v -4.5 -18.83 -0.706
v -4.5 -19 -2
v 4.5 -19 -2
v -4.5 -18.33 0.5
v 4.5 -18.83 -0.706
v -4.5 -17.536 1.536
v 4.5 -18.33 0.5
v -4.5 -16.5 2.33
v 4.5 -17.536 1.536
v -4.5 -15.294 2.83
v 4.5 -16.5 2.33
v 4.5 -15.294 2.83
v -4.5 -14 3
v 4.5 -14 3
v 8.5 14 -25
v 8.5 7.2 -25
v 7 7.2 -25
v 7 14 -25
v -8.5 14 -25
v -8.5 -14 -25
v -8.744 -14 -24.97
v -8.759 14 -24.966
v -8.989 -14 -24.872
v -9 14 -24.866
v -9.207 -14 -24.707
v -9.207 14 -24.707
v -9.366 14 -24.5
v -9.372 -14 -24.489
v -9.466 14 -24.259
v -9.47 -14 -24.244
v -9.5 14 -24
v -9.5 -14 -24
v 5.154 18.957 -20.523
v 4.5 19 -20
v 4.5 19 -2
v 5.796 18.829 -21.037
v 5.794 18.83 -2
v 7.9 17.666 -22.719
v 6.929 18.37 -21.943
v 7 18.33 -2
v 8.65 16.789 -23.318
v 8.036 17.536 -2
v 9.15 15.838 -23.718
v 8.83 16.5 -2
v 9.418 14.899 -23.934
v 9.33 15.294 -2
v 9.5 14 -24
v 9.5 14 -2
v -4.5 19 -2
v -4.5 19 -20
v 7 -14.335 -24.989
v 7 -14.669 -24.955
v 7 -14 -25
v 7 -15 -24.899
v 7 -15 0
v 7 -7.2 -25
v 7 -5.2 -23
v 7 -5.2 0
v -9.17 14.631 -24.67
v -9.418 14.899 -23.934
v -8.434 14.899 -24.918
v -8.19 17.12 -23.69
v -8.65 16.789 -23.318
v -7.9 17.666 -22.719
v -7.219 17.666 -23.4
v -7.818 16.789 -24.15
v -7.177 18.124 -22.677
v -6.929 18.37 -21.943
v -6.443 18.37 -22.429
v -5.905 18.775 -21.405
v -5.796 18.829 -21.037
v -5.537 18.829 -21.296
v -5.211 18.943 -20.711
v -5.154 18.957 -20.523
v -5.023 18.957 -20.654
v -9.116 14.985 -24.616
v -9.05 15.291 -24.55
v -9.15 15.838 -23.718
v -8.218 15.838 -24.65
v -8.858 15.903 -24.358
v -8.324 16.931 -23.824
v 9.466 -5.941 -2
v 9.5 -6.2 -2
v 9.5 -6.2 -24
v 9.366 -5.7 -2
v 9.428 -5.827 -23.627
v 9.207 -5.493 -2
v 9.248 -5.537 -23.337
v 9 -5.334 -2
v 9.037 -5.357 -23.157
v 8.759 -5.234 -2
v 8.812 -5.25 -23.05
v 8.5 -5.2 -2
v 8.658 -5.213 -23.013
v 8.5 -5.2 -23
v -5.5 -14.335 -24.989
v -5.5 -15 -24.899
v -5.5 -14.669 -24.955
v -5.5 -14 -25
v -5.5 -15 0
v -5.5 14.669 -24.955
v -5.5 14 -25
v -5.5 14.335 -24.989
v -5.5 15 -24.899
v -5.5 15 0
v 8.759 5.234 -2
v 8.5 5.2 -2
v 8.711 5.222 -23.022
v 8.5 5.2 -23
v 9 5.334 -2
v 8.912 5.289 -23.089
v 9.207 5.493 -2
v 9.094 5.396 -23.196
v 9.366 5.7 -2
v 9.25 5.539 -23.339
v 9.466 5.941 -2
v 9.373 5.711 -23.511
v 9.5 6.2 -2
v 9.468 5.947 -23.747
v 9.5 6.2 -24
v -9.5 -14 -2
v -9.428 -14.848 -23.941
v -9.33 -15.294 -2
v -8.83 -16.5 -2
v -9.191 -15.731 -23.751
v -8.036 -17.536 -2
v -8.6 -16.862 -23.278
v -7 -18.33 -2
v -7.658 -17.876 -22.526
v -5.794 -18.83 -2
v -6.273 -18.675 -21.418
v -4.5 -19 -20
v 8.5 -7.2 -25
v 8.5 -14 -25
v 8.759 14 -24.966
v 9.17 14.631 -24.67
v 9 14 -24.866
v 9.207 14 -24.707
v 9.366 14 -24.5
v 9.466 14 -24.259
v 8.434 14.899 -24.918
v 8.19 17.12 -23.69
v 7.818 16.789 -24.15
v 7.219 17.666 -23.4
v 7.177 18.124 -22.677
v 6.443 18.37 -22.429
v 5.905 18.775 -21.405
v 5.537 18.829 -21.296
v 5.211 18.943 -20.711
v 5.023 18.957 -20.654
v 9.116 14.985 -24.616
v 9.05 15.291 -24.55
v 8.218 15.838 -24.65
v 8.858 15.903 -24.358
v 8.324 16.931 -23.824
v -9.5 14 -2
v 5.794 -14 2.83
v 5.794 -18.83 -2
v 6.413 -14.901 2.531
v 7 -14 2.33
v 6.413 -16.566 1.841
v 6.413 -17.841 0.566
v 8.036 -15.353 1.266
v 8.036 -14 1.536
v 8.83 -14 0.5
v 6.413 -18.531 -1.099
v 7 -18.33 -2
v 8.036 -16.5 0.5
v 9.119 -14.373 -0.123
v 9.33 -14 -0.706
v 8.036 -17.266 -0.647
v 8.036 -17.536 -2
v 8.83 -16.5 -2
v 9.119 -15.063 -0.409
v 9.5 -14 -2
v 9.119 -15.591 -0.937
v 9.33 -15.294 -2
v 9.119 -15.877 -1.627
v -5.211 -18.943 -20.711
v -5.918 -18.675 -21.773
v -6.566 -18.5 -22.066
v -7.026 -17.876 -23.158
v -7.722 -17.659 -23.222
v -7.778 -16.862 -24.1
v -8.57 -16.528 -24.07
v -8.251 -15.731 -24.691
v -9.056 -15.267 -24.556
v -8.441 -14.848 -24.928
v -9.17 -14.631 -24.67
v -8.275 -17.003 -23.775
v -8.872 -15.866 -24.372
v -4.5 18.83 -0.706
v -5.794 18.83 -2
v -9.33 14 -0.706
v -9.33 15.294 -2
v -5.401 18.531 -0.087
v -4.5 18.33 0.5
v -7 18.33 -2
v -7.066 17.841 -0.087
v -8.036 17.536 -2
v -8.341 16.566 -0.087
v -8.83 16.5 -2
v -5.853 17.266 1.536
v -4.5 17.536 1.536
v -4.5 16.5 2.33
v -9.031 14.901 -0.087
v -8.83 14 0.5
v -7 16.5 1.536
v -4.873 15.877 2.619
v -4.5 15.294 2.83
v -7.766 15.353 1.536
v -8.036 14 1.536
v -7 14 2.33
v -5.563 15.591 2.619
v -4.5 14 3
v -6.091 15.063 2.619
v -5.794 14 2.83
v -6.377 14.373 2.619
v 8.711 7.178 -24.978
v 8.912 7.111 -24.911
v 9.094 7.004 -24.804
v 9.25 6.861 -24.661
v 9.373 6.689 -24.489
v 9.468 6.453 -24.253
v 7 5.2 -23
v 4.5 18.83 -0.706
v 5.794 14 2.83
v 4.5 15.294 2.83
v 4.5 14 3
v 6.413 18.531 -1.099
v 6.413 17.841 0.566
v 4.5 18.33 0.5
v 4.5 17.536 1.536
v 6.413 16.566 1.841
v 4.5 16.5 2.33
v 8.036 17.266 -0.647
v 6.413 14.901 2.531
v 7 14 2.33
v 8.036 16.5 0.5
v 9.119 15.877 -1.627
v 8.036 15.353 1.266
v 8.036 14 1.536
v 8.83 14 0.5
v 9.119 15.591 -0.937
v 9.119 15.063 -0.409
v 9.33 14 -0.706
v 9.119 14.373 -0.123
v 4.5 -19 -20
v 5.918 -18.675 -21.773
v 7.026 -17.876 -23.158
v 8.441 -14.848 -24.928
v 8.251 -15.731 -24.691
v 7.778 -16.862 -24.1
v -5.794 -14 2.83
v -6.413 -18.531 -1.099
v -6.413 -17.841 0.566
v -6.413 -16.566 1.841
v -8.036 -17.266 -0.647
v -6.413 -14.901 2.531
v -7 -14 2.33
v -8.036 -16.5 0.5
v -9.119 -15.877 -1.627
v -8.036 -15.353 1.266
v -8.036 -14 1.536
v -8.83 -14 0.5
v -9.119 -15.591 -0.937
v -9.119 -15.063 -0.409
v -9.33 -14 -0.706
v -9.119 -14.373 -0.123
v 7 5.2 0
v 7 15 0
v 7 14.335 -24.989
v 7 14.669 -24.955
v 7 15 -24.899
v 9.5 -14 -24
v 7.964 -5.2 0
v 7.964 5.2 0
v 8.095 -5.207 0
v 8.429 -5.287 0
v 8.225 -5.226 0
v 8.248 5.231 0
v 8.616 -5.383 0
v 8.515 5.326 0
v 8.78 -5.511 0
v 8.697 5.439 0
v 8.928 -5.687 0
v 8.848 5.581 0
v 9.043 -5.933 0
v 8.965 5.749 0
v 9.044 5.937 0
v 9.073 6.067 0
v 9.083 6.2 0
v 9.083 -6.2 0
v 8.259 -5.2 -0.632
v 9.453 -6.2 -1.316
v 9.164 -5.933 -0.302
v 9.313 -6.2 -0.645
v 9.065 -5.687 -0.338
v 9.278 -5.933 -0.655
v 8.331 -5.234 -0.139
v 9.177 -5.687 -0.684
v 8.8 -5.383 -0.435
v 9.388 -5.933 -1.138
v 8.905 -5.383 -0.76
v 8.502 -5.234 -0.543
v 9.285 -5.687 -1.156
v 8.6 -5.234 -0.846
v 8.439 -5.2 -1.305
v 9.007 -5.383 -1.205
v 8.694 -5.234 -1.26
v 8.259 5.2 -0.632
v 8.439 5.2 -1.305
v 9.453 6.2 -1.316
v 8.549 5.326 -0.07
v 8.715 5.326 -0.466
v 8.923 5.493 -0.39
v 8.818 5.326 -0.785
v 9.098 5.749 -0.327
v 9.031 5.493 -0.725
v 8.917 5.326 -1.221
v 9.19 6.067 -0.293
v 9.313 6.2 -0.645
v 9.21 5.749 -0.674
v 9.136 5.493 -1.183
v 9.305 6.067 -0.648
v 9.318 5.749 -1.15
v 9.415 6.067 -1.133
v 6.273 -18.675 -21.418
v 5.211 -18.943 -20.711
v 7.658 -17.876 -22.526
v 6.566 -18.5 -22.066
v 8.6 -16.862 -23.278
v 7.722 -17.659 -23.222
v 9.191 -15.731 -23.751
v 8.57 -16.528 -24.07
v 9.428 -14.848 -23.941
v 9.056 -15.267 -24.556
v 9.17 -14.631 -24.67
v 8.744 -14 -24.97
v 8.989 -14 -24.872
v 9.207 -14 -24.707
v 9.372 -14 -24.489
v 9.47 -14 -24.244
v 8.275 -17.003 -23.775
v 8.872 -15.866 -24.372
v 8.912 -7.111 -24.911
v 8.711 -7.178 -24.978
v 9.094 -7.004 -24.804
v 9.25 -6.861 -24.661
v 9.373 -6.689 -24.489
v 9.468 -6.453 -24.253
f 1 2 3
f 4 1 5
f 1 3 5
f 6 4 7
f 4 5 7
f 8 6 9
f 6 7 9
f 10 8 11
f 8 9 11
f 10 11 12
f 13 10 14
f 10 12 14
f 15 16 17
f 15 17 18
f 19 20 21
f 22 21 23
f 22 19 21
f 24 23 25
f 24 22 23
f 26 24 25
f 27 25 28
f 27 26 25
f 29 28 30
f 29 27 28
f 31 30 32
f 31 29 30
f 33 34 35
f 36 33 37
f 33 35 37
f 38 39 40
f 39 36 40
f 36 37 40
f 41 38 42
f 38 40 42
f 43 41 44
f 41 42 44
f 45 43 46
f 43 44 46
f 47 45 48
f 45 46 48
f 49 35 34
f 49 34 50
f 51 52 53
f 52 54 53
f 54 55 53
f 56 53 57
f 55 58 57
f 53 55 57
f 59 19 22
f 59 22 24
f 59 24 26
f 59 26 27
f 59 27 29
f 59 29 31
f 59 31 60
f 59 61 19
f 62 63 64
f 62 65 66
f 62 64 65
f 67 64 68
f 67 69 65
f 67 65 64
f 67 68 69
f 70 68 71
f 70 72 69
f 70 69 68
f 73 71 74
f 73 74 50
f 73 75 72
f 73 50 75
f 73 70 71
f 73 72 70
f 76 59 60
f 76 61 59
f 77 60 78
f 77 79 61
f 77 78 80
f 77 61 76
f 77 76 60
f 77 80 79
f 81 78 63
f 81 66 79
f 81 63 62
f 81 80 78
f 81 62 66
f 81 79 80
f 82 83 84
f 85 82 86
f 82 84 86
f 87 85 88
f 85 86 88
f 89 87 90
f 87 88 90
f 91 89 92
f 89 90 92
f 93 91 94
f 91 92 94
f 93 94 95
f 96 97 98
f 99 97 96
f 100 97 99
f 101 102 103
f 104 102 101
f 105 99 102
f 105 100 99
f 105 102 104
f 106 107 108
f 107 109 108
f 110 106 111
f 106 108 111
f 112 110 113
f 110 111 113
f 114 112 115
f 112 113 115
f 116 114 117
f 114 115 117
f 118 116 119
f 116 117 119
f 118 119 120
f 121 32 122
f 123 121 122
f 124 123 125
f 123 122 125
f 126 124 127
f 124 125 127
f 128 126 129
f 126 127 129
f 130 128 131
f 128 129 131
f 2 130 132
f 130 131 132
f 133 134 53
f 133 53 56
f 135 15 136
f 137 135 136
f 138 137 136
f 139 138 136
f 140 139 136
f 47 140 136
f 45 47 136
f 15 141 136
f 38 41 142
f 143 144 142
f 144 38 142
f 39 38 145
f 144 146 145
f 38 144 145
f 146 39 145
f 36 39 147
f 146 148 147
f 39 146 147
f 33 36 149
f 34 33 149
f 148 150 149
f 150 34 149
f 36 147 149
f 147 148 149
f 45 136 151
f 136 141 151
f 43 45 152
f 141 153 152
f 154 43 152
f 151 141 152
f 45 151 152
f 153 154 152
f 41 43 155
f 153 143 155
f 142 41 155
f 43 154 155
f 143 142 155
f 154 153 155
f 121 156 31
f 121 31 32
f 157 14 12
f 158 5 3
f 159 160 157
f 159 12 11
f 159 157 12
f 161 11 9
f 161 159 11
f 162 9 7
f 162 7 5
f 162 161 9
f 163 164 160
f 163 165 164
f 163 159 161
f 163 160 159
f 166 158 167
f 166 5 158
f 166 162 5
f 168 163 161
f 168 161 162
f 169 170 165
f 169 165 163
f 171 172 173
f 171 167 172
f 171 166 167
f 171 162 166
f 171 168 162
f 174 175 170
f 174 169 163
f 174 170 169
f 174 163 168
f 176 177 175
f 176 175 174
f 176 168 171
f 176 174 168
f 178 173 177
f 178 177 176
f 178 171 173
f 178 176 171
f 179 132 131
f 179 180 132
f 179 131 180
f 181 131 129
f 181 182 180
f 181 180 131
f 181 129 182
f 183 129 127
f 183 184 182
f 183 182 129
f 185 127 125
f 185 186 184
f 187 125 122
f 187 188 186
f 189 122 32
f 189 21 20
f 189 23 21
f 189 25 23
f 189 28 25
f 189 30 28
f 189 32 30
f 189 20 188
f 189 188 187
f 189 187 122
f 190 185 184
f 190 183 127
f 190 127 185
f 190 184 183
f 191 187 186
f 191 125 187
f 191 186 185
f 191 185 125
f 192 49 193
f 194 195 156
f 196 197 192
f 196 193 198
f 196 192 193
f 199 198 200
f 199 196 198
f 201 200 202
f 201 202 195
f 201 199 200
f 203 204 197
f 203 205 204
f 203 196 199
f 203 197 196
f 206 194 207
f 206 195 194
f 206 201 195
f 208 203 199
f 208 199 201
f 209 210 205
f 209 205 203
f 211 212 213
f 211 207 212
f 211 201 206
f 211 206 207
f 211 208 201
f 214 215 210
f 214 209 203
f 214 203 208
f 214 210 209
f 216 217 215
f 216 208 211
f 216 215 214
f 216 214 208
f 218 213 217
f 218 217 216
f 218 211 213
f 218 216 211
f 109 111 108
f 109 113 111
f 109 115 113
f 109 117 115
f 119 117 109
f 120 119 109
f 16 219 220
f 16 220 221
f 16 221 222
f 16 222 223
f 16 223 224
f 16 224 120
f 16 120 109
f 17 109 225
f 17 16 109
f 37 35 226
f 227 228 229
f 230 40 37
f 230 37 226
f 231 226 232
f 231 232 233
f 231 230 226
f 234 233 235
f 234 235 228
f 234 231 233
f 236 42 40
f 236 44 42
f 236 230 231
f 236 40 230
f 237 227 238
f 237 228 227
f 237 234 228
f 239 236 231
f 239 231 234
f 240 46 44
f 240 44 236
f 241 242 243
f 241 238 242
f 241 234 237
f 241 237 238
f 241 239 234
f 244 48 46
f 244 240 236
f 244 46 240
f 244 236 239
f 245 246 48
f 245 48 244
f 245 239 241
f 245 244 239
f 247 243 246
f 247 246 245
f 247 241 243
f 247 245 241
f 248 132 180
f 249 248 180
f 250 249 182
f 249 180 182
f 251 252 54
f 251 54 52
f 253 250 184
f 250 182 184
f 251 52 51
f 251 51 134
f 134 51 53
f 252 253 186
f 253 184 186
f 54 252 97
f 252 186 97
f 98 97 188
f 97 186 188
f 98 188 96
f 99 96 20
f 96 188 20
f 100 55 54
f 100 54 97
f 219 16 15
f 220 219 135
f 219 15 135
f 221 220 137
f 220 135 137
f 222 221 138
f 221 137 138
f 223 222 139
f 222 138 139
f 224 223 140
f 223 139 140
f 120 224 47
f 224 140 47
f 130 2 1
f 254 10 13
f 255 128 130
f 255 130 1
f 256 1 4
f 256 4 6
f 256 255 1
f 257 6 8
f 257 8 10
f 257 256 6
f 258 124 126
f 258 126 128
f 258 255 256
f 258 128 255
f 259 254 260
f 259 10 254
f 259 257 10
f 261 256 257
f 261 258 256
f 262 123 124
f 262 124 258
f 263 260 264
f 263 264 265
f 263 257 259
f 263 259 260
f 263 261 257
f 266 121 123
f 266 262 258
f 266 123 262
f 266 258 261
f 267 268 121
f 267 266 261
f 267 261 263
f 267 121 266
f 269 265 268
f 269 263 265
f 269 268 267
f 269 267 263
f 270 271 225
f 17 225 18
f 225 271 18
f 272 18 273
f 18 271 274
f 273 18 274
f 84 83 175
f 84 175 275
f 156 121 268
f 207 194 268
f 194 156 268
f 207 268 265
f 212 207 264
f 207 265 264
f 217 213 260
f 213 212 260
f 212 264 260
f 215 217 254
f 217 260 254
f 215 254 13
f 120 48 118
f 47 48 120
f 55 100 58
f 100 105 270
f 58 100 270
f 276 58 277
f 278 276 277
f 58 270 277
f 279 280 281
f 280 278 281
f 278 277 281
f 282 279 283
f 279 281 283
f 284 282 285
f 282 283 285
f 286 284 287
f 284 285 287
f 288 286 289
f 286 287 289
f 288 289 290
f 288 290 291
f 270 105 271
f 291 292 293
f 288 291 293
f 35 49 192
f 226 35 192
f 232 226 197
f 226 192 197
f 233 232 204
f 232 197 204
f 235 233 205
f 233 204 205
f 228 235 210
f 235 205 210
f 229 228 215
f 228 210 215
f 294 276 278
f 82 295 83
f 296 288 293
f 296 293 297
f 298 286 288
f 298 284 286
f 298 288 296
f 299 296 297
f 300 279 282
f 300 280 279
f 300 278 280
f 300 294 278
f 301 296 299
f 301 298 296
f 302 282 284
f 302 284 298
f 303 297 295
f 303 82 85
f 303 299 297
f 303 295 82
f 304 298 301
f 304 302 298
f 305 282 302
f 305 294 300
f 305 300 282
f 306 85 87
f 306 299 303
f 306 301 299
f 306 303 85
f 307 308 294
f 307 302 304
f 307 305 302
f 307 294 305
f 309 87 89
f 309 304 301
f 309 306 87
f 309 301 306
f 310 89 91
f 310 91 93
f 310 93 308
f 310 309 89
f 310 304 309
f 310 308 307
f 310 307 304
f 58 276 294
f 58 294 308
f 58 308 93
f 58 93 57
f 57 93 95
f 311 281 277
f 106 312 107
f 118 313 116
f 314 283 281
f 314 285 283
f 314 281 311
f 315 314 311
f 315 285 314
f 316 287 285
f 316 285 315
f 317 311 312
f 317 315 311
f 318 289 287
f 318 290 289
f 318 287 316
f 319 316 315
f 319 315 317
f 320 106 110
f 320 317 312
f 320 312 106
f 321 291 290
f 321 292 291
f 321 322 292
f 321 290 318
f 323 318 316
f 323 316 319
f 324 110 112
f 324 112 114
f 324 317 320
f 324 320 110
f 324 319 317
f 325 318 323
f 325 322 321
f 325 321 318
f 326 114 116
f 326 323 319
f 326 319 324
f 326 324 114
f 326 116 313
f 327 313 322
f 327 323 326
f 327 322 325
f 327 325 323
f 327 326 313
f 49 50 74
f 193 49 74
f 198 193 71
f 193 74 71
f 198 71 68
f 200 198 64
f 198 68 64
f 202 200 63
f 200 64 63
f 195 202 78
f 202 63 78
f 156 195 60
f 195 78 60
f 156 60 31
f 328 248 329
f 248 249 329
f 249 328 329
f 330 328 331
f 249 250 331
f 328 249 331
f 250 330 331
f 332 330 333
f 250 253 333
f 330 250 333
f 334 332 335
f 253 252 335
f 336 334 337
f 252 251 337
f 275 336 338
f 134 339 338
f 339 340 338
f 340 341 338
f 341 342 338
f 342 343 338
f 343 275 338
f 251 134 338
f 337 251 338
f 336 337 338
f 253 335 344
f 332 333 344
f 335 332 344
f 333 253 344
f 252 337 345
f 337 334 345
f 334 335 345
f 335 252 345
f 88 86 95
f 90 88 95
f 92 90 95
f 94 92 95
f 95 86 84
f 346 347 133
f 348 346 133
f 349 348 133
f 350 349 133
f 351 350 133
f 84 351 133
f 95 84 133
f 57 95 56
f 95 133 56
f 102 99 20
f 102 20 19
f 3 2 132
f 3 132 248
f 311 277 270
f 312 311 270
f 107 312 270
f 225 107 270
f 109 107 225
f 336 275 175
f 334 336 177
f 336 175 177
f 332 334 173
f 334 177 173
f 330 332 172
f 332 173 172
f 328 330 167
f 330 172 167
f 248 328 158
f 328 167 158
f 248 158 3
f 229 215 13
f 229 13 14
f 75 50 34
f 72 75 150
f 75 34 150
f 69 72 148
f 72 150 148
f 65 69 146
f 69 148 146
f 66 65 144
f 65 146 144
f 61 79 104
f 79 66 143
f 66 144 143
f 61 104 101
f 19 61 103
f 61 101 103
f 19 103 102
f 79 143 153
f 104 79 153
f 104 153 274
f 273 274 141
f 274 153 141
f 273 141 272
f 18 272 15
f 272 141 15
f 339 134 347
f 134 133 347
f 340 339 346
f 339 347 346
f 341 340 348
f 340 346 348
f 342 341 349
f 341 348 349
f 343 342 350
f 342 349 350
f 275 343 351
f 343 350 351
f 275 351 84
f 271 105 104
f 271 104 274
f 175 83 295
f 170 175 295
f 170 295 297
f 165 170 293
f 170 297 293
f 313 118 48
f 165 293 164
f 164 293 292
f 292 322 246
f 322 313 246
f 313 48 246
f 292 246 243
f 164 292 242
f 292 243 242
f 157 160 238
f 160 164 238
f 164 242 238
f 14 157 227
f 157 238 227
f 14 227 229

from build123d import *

# Parameters (mm, degrees)
SKETCH_1_W      = 19
SKETCH_1_H      = 38
EXTRUDE_1_DEPTH = 3
EXTRUDE_2_DEPTH = 25
SKETCH_5_W      = 25
SKETCH_5_H      = 9.8
EXTRUDE_3_DEPTH = 2.5
CHAMFER_1_SIZE  = 2
FILLET_2_R      = 5
FILLET_3_R      = 1
FILLET_4_R      = 1


# Some blends are built 0.0001 mm under size
with BuildPart() as part:
    # 草图1 → 凸台-拉伸1 (new body)
    with BuildSketch(Plane.XY):
        Rectangle(SKETCH_1_W, SKETCH_1_H)
    extrude(amount=EXTRUDE_1_DEPTH)

    # 草图2 → 凸台-拉伸2 (add)
    with BuildSketch(Plane(origin=(0, 0, 0), x_dir=(-1, 0, 0), z_dir=(0, 0, -1))):
        Polygon((-9.5, 19), (9.5, 19), (9.5, -19), (-9.5, -19), (-9.5, -15), (5.5, -15), (5.5, 15), (-9.5, 15), align=None)
    extrude(amount=EXTRUDE_2_DEPTH)

    # 草图5 → 凸台-拉伸3 (add)
    with BuildSketch(Plane(origin=(9.5, 0, 0), x_dir=(0, 0, -1), z_dir=(1, 0, 0))):
        with Locations((12.5, 10.1)):
            Rectangle(SKETCH_5_W, SKETCH_5_H)
        with Locations((12.5, -10.1)):
            Rectangle(SKETCH_5_W, SKETCH_5_H)
    extrude(amount=-EXTRUDE_3_DEPTH)

    # 倒角1
    chamfer_1_edges = [part.edges().sort_by_distance(p)[0] for p in [
        (8.25, 5.2, -25),
        (8.25, -5.2, -25),
    ]]
    chamfer(chamfer_1_edges, length=CHAMFER_1_SIZE)

    # 圆角2
    # the kernel refuses this fillet: 5 mm, written as the material it takes off along each edge
    with BuildSketch(Plane(origin=(4.5, -14, -2), x_dir=(0, -1, 0), z_dir=(1, 0, 0))) as fillet_2_piece_1_section:
        Polygon((0, 0), (FILLET_2_R, 0), (FILLET_2_R, -FILLET_2_R), (0, -FILLET_2_R), align=None)
    fillet_2_piece_1 = extrude(amount=FILLET_2_R, mode=Mode.PRIVATE)
    fillet_2_piece_1 = fillet_2_piece_1 - Plane(origin=(4.5, -14, -2), x_dir=(0, 0.7071067811865475, -0.7071067811865475), z_dir=(1, 0, 0)) * Sphere(FILLET_2_R, mode=Mode.PRIVATE)
    add(fillet_2_piece_1, mode=Mode.SUBTRACT)
    with BuildSketch(Plane(origin=(-4.5, -14, -2), x_dir=(0, -1, 0), z_dir=(-1, 0, 0))) as fillet_2_piece_2_section:
        Polygon((0, 0), (FILLET_2_R, 0), (FILLET_2_R, FILLET_2_R), (0, FILLET_2_R), align=None)
    fillet_2_piece_2 = extrude(amount=FILLET_2_R, mode=Mode.PRIVATE)
    fillet_2_piece_2 = fillet_2_piece_2 - Plane(origin=(-4.5, -14, -2), x_dir=(0, 0.7071067811865475, -0.7071067811865475), z_dir=(-1, 0, 0)) * Sphere(FILLET_2_R, mode=Mode.PRIVATE)
    add(fillet_2_piece_2, mode=Mode.SUBTRACT)
    with BuildSketch(Plane(origin=(-4.5, 14, -2), x_dir=(-1, 0, 0), z_dir=(0, 0, 1))) as fillet_2_piece_3_section:
        Polygon((0, 0), (FILLET_2_R, 0), (FILLET_2_R, -FILLET_2_R), (0, -FILLET_2_R), align=None)
    fillet_2_piece_3 = extrude(amount=FILLET_2_R, mode=Mode.PRIVATE)
    fillet_2_piece_3 = fillet_2_piece_3 - Plane(origin=(-4.5, 14, -2), x_dir=(0.7071067811865476, -0.7071067811865475, 0), z_dir=(0, 0, 1)) * Sphere(FILLET_2_R, mode=Mode.PRIVATE)
    add(fillet_2_piece_3, mode=Mode.SUBTRACT)
    with BuildSketch(Plane(origin=(4.5, 14, -2), x_dir=(0, 0, 1), z_dir=(1, 0, 0))) as fillet_2_piece_4_section:
        Polygon((0, 0), (FILLET_2_R, 0), (FILLET_2_R, -FILLET_2_R), (0, -FILLET_2_R), align=None)
    fillet_2_piece_4 = extrude(amount=FILLET_2_R, mode=Mode.PRIVATE)
    fillet_2_piece_4 = fillet_2_piece_4 - Plane(origin=(4.5, 14, -2), x_dir=(0, -0.7071067811865475, -0.7071067811865475), z_dir=(1, 0, 0)) * Sphere(FILLET_2_R, mode=Mode.PRIVATE)
    add(fillet_2_piece_4, mode=Mode.SUBTRACT)
    with BuildSketch(Plane(origin=(9.5, -19, -2), x_dir=(0, 1, 0), z_dir=(0, 0, -1))) as fillet_2_piece_5:
        with BuildLine():
            CenterArc((FILLET_2_R, -FILLET_2_R), FILLET_2_R, 90, 90)
            Line((0, -FILLET_2_R), (0, 0))
            Line((0, 0), (FILLET_2_R, 0))
        make_face()
    extrude(amount=35.5, mode=Mode.SUBTRACT)
    with BuildSketch(Plane(origin=(-22, -19, -25), x_dir=(0, 1, 0), z_dir=(1, 0, 0)), Plane(origin=(22, 19, -25), x_dir=(0, -1, 0), z_dir=(-1, 0, 0))) as fillet_2_piece_6:
        with BuildLine():
            CenterArc((FILLET_2_R, FILLET_2_R), FILLET_2_R, 180, 90)
            Line((0, FILLET_2_R), (0, 0))
            Line((0, 0), (FILLET_2_R, 0))
        make_face()
    extrude(amount=44, mode=Mode.SUBTRACT)
    with BuildSketch(Plane(origin=(4.5, -19, 3), x_dir=(0, 0, -1), z_dir=(-1, 0, 0)), Plane(origin=(-4.5, 19, 3), x_dir=(0, 0, -1), z_dir=(1, 0, 0))) as fillet_2_piece_7:
        with BuildLine():
            CenterArc((FILLET_2_R, -FILLET_2_R), FILLET_2_R, 90, 90)
            Line((0, -FILLET_2_R), (0, 0))
            Line((0, 0), (FILLET_2_R, 0))
        make_face()
    extrude(amount=9, mode=Mode.SUBTRACT)
    with BuildSketch(Plane(origin=(-9.5, -19, -37.5), x_dir=(1, 0, 0), z_dir=(0, 0, 1)), Plane(origin=(-9.5, 19, -37.5), x_dir=(0, -1, 0), z_dir=(0, 0, 1)), Plane(origin=(9.5, 19, -2), x_dir=(0, -1, 0), z_dir=(0, 0, -1))) as fillet_2_piece_8:
        with BuildLine():
            CenterArc((FILLET_2_R, FILLET_2_R), FILLET_2_R, 180, 90)
            Line((0, FILLET_2_R), (0, 0))
            Line((0, 0), (FILLET_2_R, 0))
        make_face()
    extrude(amount=35.5, mode=Mode.SUBTRACT)
    with BuildSketch(Plane(origin=(-9.5, -14, 3), x_dir=(0, 0, -1), z_dir=(0, 1, 0)), Plane(origin=(9.5, 14, 3), x_dir=(0, 0, -1), z_dir=(0, -1, 0))) as fillet_2_piece_9:
        with BuildLine():
            CenterArc((FILLET_2_R, -FILLET_2_R), FILLET_2_R, 90, 90)
            Line((0, -FILLET_2_R), (0, 0))
            Line((0, 0), (FILLET_2_R, 0))
        make_face()
    extrude(amount=28, mode=Mode.SUBTRACT)

    # 圆角3
    fillet_3_edges = [part.edges().sort_by_distance(p)[0] for p in [
        (-7.730244537, 17.816480084, -23.230244537),
        (-7.730244537, -17.816480084, -23.230244537),
        (-9.5, 0, -25),
    ]]
    fillet(fillet_3_edges, radius=FILLET_3_R)

    # 圆角4
    fillet_4_edges = [part.edges().sort_by_distance(p)[0] for p in [
        (9.394531565, 5.2, -0.978451782),
        (9.394531565, -5.2, -0.978451782),
        (8.035533906, 17.535533906, -23.535533906),
        (8.035533906, -17.535533906, -23.535533906),
        (9.5, -10.6, -25),
        (9.5, -5.2, -12.5),
        (9.5, 5.2, -12.5),
        (9.5, 10.6, -25),
    ]]
    fillet(fillet_4_edges, radius=FILLET_4_R - 0.0001)  # a hair under: the kernel refuses the full size


solid = part.part
